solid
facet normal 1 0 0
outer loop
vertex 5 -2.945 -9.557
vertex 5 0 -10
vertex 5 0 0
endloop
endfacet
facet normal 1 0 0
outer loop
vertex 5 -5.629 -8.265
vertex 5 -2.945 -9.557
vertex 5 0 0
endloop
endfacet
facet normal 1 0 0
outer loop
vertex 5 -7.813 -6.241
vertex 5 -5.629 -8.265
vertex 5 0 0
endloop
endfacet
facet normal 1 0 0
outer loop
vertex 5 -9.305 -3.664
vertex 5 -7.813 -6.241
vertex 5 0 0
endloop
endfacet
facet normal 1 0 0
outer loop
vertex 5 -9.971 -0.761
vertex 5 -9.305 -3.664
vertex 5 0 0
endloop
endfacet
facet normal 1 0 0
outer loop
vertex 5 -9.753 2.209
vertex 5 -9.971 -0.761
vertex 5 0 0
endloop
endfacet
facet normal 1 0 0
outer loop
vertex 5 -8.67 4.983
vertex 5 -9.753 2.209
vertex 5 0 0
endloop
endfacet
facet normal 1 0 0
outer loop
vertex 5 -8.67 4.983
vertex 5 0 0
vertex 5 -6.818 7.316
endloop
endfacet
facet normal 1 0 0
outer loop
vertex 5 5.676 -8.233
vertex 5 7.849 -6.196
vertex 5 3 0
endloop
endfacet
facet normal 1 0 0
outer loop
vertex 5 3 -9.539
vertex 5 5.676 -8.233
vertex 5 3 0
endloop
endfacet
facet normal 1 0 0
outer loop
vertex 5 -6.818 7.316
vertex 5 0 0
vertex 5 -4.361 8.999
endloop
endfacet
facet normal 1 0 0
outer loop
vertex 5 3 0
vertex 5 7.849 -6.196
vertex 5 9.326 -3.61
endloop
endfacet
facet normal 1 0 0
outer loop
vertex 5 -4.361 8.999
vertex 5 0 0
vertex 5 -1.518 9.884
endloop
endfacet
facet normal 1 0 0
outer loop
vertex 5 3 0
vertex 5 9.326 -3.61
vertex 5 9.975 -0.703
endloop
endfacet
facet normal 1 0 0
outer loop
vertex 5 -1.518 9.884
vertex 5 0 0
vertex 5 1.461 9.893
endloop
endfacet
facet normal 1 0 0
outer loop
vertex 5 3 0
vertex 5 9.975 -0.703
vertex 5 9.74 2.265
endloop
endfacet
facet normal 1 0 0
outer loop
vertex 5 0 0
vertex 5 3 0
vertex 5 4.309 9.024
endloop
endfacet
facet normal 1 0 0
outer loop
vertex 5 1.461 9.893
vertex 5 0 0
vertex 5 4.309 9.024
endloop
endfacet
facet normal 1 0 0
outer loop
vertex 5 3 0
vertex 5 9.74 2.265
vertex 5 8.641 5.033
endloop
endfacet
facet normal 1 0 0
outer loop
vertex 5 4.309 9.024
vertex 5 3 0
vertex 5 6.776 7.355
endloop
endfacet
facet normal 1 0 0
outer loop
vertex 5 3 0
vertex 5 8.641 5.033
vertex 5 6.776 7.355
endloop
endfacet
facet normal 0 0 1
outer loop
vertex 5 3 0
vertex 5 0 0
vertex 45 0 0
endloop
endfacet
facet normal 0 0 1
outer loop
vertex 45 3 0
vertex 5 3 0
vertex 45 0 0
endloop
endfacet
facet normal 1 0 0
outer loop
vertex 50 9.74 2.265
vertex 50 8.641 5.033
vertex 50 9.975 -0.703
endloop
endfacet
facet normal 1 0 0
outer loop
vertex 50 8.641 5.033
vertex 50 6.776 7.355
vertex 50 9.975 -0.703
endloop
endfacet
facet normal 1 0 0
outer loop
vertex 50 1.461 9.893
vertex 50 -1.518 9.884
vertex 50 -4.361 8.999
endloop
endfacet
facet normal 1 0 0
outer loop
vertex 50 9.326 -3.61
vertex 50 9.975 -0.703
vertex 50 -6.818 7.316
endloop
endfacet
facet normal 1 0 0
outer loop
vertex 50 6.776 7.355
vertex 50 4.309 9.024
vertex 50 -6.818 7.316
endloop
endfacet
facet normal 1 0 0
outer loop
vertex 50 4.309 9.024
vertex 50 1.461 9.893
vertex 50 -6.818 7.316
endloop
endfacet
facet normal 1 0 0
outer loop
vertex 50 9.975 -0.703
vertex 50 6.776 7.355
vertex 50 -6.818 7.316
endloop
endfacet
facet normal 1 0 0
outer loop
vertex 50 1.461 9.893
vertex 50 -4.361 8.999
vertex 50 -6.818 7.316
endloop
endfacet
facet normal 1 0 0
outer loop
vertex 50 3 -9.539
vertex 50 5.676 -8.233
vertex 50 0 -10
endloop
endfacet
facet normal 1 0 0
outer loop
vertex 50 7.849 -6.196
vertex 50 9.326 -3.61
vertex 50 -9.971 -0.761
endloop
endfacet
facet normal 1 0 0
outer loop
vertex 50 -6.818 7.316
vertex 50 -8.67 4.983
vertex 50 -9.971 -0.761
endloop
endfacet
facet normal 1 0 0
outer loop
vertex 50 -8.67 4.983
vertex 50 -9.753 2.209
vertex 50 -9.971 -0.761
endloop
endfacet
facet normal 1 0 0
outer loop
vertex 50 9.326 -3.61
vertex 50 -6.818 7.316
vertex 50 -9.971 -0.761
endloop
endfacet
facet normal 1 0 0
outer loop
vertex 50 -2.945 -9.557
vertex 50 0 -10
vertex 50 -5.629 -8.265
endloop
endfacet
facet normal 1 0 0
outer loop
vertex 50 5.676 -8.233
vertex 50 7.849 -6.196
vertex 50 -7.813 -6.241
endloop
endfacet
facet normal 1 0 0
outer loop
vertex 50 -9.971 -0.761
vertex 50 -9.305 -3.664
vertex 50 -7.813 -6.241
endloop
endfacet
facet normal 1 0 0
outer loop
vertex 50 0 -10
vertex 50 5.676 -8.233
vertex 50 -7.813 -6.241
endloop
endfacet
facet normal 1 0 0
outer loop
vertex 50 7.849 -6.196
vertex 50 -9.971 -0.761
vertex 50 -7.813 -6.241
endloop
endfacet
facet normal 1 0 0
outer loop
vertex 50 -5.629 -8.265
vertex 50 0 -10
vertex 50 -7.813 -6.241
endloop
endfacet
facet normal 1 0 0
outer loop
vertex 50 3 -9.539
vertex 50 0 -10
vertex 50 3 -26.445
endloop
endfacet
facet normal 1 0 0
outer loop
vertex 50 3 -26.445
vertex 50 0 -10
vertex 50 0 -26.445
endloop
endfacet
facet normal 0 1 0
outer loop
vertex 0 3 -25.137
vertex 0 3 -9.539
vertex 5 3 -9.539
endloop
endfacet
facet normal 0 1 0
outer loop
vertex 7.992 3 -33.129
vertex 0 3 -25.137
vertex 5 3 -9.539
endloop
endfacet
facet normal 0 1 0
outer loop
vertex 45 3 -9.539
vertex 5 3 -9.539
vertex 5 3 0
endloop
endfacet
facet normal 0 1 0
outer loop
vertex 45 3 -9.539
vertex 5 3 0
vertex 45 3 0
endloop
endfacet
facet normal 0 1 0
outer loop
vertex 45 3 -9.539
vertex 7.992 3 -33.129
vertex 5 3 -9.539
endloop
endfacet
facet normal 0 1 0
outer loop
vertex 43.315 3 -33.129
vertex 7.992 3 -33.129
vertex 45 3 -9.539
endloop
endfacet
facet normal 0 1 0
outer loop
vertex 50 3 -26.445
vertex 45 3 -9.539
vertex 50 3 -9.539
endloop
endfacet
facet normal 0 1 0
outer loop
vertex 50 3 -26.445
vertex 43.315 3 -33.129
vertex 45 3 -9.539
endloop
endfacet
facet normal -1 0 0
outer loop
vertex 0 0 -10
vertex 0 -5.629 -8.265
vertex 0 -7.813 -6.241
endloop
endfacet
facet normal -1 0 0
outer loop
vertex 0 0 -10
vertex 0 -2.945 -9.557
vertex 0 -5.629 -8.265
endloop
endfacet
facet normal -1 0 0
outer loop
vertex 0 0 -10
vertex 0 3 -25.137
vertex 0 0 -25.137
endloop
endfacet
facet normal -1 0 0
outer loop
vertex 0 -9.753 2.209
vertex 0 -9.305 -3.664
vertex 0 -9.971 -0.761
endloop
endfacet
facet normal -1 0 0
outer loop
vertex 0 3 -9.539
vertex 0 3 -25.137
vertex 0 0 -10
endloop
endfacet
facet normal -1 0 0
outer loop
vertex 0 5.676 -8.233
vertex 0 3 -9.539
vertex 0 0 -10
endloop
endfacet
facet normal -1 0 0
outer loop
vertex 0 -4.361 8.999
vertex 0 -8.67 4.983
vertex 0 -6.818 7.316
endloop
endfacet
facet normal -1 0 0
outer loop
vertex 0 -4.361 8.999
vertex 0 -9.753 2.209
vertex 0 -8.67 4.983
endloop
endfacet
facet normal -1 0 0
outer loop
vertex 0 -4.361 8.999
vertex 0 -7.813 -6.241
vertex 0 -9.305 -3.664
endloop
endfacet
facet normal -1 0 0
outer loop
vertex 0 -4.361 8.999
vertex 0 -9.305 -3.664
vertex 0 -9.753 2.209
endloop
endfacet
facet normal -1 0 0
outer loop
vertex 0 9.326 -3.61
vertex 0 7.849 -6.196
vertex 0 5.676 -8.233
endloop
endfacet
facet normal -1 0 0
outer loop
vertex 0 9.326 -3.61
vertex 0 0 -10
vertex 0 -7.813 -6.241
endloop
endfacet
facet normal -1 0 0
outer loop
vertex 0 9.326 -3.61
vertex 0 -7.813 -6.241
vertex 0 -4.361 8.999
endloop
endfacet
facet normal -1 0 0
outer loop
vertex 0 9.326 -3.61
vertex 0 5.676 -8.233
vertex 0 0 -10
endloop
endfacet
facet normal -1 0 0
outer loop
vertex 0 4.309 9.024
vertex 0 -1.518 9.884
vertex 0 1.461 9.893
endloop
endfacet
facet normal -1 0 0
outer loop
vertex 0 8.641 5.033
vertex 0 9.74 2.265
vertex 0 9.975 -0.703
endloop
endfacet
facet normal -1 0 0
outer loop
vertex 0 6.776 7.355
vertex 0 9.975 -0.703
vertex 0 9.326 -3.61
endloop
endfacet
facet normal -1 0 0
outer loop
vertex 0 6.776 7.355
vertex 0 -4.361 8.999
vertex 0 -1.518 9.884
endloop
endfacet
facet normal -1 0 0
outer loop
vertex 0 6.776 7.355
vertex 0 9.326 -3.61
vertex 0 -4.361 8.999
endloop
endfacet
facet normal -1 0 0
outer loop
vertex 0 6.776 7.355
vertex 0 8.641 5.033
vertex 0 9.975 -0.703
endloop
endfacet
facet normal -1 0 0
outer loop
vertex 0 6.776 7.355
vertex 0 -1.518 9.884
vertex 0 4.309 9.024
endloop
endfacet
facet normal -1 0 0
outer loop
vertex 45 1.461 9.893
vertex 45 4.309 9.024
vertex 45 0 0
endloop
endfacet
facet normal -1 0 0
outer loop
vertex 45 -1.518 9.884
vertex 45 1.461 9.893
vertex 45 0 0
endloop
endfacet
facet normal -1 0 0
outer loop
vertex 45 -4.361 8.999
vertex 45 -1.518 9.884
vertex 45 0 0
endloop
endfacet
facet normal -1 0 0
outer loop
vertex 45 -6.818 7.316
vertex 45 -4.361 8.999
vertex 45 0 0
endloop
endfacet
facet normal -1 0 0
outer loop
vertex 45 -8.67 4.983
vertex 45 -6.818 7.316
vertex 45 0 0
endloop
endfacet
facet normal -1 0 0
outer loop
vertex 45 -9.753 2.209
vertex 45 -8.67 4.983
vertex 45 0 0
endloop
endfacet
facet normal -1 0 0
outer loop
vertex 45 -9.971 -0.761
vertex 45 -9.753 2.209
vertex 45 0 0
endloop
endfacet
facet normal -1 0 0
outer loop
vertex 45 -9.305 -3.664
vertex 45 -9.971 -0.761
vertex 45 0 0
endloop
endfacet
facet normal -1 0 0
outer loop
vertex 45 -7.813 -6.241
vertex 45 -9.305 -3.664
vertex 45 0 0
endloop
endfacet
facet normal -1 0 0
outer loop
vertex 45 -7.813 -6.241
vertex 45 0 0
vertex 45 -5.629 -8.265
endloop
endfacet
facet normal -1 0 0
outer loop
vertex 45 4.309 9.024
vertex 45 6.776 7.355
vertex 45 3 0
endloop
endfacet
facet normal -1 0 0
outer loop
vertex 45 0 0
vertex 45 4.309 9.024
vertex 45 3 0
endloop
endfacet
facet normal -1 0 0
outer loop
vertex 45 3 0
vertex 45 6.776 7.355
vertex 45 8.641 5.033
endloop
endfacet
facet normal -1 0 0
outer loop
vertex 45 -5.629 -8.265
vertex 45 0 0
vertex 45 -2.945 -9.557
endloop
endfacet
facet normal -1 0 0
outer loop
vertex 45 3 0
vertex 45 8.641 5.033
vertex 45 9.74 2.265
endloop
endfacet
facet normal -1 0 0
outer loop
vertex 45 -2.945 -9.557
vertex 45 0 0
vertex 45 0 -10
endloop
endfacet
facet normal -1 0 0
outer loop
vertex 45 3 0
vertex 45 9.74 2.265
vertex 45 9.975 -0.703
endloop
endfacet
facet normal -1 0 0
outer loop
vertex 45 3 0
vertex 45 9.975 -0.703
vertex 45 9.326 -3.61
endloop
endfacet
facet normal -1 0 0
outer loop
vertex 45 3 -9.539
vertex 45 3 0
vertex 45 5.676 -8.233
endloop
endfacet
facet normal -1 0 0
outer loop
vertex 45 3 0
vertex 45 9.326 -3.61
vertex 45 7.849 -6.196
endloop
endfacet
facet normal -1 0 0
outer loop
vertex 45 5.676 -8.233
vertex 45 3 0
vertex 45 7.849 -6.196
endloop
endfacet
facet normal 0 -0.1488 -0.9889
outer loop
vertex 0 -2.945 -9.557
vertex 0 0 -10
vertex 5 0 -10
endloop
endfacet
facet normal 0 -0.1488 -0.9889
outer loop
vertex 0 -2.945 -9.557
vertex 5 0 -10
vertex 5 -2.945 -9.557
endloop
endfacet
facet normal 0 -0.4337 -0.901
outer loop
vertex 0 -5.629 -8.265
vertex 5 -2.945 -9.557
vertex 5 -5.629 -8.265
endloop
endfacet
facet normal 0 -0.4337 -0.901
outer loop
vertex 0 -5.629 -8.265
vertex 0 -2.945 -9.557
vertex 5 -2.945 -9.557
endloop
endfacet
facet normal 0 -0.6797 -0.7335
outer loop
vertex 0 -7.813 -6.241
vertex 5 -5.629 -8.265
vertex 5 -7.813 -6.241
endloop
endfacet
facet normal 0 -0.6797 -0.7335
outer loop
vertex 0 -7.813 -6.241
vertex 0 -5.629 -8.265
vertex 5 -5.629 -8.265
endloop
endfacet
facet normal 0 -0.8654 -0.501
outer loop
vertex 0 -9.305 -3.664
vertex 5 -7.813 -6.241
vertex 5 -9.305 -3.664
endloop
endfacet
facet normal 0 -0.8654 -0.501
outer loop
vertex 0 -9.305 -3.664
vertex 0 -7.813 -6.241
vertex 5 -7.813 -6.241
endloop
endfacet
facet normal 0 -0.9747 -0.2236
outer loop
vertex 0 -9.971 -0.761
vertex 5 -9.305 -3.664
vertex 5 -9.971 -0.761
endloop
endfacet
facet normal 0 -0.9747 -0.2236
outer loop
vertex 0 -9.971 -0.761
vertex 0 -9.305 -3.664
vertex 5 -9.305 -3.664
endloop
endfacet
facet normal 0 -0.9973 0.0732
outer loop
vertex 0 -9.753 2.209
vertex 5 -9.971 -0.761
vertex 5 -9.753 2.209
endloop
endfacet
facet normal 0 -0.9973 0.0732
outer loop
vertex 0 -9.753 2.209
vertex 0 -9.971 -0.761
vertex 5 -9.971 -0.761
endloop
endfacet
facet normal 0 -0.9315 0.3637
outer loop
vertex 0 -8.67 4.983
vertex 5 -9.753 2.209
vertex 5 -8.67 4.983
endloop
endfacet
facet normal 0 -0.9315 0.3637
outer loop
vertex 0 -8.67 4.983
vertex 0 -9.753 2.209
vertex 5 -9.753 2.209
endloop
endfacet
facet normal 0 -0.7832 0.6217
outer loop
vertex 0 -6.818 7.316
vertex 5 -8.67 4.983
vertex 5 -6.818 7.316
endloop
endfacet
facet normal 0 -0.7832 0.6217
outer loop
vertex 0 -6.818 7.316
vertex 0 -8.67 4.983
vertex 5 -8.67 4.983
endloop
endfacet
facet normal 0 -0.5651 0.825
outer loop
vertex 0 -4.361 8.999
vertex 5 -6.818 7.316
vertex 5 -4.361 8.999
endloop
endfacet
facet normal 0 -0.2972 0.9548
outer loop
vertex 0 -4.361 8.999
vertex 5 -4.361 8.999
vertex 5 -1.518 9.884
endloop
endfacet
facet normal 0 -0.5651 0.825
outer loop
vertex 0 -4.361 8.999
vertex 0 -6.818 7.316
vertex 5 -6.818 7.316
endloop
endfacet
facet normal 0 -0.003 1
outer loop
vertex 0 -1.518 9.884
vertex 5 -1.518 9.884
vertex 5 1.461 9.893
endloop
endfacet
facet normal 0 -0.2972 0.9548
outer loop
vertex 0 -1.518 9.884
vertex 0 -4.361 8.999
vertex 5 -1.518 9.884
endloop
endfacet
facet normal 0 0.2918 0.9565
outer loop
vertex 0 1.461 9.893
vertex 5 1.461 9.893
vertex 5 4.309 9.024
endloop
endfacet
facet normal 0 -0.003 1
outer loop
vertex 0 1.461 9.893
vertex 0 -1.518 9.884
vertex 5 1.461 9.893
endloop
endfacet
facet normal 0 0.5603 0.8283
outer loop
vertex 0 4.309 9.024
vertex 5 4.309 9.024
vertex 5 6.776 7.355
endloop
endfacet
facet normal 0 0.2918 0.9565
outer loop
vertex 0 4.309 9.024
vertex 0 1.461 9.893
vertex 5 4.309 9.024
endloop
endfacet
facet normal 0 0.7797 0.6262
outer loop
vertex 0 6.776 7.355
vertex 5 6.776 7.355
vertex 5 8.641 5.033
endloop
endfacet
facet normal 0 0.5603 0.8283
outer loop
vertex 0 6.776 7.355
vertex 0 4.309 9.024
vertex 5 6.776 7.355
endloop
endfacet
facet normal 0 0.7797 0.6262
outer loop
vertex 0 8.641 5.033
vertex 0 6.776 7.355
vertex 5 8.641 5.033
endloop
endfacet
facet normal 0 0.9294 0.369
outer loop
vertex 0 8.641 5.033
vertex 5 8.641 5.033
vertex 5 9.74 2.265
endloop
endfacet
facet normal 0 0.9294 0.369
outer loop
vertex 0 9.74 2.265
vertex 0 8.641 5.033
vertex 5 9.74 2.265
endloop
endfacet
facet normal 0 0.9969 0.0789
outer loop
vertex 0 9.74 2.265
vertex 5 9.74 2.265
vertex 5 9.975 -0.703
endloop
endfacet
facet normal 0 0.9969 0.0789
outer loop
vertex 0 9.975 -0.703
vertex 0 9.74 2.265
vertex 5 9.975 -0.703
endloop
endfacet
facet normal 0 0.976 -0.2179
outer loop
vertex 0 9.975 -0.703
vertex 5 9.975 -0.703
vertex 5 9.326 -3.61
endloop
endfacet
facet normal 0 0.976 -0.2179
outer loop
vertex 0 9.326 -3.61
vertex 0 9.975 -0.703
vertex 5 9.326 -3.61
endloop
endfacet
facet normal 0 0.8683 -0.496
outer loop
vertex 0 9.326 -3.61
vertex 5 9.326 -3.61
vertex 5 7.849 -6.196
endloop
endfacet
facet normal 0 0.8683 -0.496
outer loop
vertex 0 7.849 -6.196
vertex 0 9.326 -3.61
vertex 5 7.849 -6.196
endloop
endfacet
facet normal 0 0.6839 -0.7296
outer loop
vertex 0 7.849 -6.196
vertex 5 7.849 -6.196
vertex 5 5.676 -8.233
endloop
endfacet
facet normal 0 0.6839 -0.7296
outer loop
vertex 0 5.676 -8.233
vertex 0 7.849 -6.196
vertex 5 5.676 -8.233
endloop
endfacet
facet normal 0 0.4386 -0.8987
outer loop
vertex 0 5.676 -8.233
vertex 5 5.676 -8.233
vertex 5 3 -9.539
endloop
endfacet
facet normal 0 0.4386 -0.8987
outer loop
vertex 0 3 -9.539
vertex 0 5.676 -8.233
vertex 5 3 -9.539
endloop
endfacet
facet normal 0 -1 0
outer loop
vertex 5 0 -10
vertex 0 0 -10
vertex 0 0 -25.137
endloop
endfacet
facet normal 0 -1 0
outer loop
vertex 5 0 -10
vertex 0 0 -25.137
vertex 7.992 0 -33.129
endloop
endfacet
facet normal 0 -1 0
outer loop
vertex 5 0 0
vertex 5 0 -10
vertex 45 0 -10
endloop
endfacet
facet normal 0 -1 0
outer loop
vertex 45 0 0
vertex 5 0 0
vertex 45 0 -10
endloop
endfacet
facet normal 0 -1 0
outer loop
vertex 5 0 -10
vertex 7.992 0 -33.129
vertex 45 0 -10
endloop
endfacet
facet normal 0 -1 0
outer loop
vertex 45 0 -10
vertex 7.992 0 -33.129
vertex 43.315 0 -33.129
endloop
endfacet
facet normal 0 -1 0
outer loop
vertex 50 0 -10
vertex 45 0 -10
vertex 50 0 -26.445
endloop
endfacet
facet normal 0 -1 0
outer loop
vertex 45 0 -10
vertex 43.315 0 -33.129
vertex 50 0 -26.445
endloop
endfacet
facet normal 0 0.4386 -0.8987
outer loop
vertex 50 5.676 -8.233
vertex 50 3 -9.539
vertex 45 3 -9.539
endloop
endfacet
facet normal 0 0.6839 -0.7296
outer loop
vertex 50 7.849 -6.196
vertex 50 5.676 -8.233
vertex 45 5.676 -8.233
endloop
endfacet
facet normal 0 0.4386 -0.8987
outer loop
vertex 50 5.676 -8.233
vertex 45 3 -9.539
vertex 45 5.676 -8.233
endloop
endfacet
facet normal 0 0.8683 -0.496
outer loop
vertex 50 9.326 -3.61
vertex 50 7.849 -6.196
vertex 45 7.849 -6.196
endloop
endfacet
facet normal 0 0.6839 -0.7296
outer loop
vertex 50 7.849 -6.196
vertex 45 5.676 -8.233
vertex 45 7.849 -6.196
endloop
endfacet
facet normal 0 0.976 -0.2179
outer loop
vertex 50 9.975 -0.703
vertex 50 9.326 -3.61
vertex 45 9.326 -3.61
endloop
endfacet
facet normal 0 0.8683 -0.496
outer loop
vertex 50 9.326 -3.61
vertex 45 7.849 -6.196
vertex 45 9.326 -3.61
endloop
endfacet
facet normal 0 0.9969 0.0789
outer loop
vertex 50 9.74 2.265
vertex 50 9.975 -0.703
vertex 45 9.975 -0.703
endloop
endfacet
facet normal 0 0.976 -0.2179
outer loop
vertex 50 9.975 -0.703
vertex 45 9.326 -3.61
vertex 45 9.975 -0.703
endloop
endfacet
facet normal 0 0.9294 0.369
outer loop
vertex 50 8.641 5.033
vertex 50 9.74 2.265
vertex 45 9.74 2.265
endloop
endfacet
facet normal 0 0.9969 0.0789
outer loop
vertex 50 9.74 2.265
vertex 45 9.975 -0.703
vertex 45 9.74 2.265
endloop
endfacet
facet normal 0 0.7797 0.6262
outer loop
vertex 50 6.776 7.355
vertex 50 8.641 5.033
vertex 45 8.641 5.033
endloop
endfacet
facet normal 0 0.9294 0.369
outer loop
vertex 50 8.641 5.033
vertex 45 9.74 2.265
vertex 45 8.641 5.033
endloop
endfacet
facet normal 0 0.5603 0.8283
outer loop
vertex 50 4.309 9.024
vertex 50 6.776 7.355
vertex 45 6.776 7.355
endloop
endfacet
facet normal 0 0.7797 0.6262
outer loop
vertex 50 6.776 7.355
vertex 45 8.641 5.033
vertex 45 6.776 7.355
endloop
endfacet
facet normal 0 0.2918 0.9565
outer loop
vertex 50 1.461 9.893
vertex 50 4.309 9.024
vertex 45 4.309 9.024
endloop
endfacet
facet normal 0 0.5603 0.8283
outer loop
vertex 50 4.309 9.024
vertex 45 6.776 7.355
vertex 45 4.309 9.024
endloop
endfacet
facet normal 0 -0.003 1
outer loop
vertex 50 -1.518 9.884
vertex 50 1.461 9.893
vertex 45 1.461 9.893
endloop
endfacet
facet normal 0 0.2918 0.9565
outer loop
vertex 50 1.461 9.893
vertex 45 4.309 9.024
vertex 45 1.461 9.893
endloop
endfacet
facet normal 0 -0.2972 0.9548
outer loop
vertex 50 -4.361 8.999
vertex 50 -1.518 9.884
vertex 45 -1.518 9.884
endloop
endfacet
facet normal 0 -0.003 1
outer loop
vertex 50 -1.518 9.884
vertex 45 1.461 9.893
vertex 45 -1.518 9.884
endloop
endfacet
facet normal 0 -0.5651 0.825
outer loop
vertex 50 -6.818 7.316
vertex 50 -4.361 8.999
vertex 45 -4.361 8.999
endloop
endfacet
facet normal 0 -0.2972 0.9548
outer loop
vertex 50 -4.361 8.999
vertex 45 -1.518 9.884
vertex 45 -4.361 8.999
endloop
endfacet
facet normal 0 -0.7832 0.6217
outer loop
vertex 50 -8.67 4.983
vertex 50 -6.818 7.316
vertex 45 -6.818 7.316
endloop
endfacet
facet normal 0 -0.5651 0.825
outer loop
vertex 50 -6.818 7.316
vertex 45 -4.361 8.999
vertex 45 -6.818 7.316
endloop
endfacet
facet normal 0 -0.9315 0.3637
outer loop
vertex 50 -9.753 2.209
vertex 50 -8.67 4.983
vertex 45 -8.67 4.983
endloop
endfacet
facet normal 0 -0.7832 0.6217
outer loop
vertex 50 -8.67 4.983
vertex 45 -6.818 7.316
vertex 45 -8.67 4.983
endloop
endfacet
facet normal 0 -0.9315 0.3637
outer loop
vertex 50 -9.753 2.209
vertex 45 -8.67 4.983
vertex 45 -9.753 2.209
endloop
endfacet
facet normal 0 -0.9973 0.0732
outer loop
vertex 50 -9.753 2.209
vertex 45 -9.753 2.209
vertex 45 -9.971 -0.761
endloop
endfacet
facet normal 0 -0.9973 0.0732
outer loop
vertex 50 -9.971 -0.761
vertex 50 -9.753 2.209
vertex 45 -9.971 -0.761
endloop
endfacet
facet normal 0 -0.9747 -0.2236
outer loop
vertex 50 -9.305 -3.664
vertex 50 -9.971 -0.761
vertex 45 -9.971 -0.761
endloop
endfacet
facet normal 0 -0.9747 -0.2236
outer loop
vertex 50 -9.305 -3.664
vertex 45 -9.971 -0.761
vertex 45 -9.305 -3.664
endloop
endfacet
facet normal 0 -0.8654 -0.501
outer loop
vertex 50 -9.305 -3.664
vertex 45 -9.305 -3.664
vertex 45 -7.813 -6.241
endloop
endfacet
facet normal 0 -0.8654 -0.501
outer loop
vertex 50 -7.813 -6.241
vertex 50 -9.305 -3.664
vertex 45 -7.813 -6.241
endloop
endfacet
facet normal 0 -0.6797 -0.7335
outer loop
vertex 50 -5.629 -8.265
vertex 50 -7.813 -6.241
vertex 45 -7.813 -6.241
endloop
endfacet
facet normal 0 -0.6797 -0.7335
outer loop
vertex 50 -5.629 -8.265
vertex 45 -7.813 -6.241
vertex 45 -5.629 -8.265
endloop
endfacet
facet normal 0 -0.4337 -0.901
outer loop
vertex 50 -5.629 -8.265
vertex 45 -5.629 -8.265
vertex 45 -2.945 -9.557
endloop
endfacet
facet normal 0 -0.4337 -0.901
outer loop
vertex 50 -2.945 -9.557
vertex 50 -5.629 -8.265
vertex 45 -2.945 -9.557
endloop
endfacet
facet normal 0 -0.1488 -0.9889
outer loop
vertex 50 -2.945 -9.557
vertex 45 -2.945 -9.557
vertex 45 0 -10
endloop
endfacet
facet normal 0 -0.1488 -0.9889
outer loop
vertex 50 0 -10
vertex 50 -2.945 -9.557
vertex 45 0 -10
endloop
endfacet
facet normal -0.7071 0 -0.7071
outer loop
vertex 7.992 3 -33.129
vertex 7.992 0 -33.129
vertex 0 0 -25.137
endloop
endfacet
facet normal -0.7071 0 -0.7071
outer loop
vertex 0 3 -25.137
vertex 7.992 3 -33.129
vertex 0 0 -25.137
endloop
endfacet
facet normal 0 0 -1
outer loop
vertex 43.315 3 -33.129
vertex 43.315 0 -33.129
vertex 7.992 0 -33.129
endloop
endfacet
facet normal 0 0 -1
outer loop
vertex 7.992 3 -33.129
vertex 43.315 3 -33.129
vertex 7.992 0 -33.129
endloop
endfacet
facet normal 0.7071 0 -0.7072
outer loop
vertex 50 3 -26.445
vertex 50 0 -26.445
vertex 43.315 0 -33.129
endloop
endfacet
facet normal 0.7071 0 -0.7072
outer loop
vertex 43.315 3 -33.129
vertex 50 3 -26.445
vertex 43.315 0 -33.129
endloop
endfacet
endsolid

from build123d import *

# Parameters (mm, degrees)
SKETCH12_W          = 5
SKETCH12_H          = 20
BOSS_EXTRUDE3_DEPTH = 3
SKETCH13_R          = 10
BOSS_EXTRUDE4_DEPTH = 5
BOSS_EXTRUDE6_START = -5
SKETCH14_R          = 10
BOSS_EXTRUDE6_DEPTH = 5


with BuildPart() as part:
    # Sketch12 → Boss-Extrude3 (new body)
    with BuildSketch(Plane(origin=(0, 0, 0), x_dir=(1, 0, 0), z_dir=(0, 1, 0))):
        Polygon((7.992304902, 33.129302691), (0, 25.13699779), (0, 20), (5, 20), (5, 0), (45, 0), (45, 20), (50, 20), (50, 26.444694099), (43.315391407, 33.129302691), align=None)
        with Locations((47.5, 10)):
            Rectangle(SKETCH12_W, SKETCH12_H)
        with Locations((2.5, 10)):
            Rectangle(SKETCH12_W, SKETCH12_H)
    extrude(amount=BOSS_EXTRUDE3_DEPTH)

    # Sketch13 → Boss-Extrude4 (add)
    with BuildSketch(Plane.ZY):
        Circle(SKETCH13_R)
    extrude(amount=-BOSS_EXTRUDE4_DEPTH)

    # Sketch14 → Boss-Extrude6 (add)
    with BuildSketch(Plane(origin=(50, 0, 0), x_dir=(0, 0, -1), z_dir=(1, 0, 0)).offset(BOSS_EXTRUDE6_START)):
        Circle(SKETCH14_R)
    extrude(amount=BOSS_EXTRUDE6_DEPTH)


solid = part.part
